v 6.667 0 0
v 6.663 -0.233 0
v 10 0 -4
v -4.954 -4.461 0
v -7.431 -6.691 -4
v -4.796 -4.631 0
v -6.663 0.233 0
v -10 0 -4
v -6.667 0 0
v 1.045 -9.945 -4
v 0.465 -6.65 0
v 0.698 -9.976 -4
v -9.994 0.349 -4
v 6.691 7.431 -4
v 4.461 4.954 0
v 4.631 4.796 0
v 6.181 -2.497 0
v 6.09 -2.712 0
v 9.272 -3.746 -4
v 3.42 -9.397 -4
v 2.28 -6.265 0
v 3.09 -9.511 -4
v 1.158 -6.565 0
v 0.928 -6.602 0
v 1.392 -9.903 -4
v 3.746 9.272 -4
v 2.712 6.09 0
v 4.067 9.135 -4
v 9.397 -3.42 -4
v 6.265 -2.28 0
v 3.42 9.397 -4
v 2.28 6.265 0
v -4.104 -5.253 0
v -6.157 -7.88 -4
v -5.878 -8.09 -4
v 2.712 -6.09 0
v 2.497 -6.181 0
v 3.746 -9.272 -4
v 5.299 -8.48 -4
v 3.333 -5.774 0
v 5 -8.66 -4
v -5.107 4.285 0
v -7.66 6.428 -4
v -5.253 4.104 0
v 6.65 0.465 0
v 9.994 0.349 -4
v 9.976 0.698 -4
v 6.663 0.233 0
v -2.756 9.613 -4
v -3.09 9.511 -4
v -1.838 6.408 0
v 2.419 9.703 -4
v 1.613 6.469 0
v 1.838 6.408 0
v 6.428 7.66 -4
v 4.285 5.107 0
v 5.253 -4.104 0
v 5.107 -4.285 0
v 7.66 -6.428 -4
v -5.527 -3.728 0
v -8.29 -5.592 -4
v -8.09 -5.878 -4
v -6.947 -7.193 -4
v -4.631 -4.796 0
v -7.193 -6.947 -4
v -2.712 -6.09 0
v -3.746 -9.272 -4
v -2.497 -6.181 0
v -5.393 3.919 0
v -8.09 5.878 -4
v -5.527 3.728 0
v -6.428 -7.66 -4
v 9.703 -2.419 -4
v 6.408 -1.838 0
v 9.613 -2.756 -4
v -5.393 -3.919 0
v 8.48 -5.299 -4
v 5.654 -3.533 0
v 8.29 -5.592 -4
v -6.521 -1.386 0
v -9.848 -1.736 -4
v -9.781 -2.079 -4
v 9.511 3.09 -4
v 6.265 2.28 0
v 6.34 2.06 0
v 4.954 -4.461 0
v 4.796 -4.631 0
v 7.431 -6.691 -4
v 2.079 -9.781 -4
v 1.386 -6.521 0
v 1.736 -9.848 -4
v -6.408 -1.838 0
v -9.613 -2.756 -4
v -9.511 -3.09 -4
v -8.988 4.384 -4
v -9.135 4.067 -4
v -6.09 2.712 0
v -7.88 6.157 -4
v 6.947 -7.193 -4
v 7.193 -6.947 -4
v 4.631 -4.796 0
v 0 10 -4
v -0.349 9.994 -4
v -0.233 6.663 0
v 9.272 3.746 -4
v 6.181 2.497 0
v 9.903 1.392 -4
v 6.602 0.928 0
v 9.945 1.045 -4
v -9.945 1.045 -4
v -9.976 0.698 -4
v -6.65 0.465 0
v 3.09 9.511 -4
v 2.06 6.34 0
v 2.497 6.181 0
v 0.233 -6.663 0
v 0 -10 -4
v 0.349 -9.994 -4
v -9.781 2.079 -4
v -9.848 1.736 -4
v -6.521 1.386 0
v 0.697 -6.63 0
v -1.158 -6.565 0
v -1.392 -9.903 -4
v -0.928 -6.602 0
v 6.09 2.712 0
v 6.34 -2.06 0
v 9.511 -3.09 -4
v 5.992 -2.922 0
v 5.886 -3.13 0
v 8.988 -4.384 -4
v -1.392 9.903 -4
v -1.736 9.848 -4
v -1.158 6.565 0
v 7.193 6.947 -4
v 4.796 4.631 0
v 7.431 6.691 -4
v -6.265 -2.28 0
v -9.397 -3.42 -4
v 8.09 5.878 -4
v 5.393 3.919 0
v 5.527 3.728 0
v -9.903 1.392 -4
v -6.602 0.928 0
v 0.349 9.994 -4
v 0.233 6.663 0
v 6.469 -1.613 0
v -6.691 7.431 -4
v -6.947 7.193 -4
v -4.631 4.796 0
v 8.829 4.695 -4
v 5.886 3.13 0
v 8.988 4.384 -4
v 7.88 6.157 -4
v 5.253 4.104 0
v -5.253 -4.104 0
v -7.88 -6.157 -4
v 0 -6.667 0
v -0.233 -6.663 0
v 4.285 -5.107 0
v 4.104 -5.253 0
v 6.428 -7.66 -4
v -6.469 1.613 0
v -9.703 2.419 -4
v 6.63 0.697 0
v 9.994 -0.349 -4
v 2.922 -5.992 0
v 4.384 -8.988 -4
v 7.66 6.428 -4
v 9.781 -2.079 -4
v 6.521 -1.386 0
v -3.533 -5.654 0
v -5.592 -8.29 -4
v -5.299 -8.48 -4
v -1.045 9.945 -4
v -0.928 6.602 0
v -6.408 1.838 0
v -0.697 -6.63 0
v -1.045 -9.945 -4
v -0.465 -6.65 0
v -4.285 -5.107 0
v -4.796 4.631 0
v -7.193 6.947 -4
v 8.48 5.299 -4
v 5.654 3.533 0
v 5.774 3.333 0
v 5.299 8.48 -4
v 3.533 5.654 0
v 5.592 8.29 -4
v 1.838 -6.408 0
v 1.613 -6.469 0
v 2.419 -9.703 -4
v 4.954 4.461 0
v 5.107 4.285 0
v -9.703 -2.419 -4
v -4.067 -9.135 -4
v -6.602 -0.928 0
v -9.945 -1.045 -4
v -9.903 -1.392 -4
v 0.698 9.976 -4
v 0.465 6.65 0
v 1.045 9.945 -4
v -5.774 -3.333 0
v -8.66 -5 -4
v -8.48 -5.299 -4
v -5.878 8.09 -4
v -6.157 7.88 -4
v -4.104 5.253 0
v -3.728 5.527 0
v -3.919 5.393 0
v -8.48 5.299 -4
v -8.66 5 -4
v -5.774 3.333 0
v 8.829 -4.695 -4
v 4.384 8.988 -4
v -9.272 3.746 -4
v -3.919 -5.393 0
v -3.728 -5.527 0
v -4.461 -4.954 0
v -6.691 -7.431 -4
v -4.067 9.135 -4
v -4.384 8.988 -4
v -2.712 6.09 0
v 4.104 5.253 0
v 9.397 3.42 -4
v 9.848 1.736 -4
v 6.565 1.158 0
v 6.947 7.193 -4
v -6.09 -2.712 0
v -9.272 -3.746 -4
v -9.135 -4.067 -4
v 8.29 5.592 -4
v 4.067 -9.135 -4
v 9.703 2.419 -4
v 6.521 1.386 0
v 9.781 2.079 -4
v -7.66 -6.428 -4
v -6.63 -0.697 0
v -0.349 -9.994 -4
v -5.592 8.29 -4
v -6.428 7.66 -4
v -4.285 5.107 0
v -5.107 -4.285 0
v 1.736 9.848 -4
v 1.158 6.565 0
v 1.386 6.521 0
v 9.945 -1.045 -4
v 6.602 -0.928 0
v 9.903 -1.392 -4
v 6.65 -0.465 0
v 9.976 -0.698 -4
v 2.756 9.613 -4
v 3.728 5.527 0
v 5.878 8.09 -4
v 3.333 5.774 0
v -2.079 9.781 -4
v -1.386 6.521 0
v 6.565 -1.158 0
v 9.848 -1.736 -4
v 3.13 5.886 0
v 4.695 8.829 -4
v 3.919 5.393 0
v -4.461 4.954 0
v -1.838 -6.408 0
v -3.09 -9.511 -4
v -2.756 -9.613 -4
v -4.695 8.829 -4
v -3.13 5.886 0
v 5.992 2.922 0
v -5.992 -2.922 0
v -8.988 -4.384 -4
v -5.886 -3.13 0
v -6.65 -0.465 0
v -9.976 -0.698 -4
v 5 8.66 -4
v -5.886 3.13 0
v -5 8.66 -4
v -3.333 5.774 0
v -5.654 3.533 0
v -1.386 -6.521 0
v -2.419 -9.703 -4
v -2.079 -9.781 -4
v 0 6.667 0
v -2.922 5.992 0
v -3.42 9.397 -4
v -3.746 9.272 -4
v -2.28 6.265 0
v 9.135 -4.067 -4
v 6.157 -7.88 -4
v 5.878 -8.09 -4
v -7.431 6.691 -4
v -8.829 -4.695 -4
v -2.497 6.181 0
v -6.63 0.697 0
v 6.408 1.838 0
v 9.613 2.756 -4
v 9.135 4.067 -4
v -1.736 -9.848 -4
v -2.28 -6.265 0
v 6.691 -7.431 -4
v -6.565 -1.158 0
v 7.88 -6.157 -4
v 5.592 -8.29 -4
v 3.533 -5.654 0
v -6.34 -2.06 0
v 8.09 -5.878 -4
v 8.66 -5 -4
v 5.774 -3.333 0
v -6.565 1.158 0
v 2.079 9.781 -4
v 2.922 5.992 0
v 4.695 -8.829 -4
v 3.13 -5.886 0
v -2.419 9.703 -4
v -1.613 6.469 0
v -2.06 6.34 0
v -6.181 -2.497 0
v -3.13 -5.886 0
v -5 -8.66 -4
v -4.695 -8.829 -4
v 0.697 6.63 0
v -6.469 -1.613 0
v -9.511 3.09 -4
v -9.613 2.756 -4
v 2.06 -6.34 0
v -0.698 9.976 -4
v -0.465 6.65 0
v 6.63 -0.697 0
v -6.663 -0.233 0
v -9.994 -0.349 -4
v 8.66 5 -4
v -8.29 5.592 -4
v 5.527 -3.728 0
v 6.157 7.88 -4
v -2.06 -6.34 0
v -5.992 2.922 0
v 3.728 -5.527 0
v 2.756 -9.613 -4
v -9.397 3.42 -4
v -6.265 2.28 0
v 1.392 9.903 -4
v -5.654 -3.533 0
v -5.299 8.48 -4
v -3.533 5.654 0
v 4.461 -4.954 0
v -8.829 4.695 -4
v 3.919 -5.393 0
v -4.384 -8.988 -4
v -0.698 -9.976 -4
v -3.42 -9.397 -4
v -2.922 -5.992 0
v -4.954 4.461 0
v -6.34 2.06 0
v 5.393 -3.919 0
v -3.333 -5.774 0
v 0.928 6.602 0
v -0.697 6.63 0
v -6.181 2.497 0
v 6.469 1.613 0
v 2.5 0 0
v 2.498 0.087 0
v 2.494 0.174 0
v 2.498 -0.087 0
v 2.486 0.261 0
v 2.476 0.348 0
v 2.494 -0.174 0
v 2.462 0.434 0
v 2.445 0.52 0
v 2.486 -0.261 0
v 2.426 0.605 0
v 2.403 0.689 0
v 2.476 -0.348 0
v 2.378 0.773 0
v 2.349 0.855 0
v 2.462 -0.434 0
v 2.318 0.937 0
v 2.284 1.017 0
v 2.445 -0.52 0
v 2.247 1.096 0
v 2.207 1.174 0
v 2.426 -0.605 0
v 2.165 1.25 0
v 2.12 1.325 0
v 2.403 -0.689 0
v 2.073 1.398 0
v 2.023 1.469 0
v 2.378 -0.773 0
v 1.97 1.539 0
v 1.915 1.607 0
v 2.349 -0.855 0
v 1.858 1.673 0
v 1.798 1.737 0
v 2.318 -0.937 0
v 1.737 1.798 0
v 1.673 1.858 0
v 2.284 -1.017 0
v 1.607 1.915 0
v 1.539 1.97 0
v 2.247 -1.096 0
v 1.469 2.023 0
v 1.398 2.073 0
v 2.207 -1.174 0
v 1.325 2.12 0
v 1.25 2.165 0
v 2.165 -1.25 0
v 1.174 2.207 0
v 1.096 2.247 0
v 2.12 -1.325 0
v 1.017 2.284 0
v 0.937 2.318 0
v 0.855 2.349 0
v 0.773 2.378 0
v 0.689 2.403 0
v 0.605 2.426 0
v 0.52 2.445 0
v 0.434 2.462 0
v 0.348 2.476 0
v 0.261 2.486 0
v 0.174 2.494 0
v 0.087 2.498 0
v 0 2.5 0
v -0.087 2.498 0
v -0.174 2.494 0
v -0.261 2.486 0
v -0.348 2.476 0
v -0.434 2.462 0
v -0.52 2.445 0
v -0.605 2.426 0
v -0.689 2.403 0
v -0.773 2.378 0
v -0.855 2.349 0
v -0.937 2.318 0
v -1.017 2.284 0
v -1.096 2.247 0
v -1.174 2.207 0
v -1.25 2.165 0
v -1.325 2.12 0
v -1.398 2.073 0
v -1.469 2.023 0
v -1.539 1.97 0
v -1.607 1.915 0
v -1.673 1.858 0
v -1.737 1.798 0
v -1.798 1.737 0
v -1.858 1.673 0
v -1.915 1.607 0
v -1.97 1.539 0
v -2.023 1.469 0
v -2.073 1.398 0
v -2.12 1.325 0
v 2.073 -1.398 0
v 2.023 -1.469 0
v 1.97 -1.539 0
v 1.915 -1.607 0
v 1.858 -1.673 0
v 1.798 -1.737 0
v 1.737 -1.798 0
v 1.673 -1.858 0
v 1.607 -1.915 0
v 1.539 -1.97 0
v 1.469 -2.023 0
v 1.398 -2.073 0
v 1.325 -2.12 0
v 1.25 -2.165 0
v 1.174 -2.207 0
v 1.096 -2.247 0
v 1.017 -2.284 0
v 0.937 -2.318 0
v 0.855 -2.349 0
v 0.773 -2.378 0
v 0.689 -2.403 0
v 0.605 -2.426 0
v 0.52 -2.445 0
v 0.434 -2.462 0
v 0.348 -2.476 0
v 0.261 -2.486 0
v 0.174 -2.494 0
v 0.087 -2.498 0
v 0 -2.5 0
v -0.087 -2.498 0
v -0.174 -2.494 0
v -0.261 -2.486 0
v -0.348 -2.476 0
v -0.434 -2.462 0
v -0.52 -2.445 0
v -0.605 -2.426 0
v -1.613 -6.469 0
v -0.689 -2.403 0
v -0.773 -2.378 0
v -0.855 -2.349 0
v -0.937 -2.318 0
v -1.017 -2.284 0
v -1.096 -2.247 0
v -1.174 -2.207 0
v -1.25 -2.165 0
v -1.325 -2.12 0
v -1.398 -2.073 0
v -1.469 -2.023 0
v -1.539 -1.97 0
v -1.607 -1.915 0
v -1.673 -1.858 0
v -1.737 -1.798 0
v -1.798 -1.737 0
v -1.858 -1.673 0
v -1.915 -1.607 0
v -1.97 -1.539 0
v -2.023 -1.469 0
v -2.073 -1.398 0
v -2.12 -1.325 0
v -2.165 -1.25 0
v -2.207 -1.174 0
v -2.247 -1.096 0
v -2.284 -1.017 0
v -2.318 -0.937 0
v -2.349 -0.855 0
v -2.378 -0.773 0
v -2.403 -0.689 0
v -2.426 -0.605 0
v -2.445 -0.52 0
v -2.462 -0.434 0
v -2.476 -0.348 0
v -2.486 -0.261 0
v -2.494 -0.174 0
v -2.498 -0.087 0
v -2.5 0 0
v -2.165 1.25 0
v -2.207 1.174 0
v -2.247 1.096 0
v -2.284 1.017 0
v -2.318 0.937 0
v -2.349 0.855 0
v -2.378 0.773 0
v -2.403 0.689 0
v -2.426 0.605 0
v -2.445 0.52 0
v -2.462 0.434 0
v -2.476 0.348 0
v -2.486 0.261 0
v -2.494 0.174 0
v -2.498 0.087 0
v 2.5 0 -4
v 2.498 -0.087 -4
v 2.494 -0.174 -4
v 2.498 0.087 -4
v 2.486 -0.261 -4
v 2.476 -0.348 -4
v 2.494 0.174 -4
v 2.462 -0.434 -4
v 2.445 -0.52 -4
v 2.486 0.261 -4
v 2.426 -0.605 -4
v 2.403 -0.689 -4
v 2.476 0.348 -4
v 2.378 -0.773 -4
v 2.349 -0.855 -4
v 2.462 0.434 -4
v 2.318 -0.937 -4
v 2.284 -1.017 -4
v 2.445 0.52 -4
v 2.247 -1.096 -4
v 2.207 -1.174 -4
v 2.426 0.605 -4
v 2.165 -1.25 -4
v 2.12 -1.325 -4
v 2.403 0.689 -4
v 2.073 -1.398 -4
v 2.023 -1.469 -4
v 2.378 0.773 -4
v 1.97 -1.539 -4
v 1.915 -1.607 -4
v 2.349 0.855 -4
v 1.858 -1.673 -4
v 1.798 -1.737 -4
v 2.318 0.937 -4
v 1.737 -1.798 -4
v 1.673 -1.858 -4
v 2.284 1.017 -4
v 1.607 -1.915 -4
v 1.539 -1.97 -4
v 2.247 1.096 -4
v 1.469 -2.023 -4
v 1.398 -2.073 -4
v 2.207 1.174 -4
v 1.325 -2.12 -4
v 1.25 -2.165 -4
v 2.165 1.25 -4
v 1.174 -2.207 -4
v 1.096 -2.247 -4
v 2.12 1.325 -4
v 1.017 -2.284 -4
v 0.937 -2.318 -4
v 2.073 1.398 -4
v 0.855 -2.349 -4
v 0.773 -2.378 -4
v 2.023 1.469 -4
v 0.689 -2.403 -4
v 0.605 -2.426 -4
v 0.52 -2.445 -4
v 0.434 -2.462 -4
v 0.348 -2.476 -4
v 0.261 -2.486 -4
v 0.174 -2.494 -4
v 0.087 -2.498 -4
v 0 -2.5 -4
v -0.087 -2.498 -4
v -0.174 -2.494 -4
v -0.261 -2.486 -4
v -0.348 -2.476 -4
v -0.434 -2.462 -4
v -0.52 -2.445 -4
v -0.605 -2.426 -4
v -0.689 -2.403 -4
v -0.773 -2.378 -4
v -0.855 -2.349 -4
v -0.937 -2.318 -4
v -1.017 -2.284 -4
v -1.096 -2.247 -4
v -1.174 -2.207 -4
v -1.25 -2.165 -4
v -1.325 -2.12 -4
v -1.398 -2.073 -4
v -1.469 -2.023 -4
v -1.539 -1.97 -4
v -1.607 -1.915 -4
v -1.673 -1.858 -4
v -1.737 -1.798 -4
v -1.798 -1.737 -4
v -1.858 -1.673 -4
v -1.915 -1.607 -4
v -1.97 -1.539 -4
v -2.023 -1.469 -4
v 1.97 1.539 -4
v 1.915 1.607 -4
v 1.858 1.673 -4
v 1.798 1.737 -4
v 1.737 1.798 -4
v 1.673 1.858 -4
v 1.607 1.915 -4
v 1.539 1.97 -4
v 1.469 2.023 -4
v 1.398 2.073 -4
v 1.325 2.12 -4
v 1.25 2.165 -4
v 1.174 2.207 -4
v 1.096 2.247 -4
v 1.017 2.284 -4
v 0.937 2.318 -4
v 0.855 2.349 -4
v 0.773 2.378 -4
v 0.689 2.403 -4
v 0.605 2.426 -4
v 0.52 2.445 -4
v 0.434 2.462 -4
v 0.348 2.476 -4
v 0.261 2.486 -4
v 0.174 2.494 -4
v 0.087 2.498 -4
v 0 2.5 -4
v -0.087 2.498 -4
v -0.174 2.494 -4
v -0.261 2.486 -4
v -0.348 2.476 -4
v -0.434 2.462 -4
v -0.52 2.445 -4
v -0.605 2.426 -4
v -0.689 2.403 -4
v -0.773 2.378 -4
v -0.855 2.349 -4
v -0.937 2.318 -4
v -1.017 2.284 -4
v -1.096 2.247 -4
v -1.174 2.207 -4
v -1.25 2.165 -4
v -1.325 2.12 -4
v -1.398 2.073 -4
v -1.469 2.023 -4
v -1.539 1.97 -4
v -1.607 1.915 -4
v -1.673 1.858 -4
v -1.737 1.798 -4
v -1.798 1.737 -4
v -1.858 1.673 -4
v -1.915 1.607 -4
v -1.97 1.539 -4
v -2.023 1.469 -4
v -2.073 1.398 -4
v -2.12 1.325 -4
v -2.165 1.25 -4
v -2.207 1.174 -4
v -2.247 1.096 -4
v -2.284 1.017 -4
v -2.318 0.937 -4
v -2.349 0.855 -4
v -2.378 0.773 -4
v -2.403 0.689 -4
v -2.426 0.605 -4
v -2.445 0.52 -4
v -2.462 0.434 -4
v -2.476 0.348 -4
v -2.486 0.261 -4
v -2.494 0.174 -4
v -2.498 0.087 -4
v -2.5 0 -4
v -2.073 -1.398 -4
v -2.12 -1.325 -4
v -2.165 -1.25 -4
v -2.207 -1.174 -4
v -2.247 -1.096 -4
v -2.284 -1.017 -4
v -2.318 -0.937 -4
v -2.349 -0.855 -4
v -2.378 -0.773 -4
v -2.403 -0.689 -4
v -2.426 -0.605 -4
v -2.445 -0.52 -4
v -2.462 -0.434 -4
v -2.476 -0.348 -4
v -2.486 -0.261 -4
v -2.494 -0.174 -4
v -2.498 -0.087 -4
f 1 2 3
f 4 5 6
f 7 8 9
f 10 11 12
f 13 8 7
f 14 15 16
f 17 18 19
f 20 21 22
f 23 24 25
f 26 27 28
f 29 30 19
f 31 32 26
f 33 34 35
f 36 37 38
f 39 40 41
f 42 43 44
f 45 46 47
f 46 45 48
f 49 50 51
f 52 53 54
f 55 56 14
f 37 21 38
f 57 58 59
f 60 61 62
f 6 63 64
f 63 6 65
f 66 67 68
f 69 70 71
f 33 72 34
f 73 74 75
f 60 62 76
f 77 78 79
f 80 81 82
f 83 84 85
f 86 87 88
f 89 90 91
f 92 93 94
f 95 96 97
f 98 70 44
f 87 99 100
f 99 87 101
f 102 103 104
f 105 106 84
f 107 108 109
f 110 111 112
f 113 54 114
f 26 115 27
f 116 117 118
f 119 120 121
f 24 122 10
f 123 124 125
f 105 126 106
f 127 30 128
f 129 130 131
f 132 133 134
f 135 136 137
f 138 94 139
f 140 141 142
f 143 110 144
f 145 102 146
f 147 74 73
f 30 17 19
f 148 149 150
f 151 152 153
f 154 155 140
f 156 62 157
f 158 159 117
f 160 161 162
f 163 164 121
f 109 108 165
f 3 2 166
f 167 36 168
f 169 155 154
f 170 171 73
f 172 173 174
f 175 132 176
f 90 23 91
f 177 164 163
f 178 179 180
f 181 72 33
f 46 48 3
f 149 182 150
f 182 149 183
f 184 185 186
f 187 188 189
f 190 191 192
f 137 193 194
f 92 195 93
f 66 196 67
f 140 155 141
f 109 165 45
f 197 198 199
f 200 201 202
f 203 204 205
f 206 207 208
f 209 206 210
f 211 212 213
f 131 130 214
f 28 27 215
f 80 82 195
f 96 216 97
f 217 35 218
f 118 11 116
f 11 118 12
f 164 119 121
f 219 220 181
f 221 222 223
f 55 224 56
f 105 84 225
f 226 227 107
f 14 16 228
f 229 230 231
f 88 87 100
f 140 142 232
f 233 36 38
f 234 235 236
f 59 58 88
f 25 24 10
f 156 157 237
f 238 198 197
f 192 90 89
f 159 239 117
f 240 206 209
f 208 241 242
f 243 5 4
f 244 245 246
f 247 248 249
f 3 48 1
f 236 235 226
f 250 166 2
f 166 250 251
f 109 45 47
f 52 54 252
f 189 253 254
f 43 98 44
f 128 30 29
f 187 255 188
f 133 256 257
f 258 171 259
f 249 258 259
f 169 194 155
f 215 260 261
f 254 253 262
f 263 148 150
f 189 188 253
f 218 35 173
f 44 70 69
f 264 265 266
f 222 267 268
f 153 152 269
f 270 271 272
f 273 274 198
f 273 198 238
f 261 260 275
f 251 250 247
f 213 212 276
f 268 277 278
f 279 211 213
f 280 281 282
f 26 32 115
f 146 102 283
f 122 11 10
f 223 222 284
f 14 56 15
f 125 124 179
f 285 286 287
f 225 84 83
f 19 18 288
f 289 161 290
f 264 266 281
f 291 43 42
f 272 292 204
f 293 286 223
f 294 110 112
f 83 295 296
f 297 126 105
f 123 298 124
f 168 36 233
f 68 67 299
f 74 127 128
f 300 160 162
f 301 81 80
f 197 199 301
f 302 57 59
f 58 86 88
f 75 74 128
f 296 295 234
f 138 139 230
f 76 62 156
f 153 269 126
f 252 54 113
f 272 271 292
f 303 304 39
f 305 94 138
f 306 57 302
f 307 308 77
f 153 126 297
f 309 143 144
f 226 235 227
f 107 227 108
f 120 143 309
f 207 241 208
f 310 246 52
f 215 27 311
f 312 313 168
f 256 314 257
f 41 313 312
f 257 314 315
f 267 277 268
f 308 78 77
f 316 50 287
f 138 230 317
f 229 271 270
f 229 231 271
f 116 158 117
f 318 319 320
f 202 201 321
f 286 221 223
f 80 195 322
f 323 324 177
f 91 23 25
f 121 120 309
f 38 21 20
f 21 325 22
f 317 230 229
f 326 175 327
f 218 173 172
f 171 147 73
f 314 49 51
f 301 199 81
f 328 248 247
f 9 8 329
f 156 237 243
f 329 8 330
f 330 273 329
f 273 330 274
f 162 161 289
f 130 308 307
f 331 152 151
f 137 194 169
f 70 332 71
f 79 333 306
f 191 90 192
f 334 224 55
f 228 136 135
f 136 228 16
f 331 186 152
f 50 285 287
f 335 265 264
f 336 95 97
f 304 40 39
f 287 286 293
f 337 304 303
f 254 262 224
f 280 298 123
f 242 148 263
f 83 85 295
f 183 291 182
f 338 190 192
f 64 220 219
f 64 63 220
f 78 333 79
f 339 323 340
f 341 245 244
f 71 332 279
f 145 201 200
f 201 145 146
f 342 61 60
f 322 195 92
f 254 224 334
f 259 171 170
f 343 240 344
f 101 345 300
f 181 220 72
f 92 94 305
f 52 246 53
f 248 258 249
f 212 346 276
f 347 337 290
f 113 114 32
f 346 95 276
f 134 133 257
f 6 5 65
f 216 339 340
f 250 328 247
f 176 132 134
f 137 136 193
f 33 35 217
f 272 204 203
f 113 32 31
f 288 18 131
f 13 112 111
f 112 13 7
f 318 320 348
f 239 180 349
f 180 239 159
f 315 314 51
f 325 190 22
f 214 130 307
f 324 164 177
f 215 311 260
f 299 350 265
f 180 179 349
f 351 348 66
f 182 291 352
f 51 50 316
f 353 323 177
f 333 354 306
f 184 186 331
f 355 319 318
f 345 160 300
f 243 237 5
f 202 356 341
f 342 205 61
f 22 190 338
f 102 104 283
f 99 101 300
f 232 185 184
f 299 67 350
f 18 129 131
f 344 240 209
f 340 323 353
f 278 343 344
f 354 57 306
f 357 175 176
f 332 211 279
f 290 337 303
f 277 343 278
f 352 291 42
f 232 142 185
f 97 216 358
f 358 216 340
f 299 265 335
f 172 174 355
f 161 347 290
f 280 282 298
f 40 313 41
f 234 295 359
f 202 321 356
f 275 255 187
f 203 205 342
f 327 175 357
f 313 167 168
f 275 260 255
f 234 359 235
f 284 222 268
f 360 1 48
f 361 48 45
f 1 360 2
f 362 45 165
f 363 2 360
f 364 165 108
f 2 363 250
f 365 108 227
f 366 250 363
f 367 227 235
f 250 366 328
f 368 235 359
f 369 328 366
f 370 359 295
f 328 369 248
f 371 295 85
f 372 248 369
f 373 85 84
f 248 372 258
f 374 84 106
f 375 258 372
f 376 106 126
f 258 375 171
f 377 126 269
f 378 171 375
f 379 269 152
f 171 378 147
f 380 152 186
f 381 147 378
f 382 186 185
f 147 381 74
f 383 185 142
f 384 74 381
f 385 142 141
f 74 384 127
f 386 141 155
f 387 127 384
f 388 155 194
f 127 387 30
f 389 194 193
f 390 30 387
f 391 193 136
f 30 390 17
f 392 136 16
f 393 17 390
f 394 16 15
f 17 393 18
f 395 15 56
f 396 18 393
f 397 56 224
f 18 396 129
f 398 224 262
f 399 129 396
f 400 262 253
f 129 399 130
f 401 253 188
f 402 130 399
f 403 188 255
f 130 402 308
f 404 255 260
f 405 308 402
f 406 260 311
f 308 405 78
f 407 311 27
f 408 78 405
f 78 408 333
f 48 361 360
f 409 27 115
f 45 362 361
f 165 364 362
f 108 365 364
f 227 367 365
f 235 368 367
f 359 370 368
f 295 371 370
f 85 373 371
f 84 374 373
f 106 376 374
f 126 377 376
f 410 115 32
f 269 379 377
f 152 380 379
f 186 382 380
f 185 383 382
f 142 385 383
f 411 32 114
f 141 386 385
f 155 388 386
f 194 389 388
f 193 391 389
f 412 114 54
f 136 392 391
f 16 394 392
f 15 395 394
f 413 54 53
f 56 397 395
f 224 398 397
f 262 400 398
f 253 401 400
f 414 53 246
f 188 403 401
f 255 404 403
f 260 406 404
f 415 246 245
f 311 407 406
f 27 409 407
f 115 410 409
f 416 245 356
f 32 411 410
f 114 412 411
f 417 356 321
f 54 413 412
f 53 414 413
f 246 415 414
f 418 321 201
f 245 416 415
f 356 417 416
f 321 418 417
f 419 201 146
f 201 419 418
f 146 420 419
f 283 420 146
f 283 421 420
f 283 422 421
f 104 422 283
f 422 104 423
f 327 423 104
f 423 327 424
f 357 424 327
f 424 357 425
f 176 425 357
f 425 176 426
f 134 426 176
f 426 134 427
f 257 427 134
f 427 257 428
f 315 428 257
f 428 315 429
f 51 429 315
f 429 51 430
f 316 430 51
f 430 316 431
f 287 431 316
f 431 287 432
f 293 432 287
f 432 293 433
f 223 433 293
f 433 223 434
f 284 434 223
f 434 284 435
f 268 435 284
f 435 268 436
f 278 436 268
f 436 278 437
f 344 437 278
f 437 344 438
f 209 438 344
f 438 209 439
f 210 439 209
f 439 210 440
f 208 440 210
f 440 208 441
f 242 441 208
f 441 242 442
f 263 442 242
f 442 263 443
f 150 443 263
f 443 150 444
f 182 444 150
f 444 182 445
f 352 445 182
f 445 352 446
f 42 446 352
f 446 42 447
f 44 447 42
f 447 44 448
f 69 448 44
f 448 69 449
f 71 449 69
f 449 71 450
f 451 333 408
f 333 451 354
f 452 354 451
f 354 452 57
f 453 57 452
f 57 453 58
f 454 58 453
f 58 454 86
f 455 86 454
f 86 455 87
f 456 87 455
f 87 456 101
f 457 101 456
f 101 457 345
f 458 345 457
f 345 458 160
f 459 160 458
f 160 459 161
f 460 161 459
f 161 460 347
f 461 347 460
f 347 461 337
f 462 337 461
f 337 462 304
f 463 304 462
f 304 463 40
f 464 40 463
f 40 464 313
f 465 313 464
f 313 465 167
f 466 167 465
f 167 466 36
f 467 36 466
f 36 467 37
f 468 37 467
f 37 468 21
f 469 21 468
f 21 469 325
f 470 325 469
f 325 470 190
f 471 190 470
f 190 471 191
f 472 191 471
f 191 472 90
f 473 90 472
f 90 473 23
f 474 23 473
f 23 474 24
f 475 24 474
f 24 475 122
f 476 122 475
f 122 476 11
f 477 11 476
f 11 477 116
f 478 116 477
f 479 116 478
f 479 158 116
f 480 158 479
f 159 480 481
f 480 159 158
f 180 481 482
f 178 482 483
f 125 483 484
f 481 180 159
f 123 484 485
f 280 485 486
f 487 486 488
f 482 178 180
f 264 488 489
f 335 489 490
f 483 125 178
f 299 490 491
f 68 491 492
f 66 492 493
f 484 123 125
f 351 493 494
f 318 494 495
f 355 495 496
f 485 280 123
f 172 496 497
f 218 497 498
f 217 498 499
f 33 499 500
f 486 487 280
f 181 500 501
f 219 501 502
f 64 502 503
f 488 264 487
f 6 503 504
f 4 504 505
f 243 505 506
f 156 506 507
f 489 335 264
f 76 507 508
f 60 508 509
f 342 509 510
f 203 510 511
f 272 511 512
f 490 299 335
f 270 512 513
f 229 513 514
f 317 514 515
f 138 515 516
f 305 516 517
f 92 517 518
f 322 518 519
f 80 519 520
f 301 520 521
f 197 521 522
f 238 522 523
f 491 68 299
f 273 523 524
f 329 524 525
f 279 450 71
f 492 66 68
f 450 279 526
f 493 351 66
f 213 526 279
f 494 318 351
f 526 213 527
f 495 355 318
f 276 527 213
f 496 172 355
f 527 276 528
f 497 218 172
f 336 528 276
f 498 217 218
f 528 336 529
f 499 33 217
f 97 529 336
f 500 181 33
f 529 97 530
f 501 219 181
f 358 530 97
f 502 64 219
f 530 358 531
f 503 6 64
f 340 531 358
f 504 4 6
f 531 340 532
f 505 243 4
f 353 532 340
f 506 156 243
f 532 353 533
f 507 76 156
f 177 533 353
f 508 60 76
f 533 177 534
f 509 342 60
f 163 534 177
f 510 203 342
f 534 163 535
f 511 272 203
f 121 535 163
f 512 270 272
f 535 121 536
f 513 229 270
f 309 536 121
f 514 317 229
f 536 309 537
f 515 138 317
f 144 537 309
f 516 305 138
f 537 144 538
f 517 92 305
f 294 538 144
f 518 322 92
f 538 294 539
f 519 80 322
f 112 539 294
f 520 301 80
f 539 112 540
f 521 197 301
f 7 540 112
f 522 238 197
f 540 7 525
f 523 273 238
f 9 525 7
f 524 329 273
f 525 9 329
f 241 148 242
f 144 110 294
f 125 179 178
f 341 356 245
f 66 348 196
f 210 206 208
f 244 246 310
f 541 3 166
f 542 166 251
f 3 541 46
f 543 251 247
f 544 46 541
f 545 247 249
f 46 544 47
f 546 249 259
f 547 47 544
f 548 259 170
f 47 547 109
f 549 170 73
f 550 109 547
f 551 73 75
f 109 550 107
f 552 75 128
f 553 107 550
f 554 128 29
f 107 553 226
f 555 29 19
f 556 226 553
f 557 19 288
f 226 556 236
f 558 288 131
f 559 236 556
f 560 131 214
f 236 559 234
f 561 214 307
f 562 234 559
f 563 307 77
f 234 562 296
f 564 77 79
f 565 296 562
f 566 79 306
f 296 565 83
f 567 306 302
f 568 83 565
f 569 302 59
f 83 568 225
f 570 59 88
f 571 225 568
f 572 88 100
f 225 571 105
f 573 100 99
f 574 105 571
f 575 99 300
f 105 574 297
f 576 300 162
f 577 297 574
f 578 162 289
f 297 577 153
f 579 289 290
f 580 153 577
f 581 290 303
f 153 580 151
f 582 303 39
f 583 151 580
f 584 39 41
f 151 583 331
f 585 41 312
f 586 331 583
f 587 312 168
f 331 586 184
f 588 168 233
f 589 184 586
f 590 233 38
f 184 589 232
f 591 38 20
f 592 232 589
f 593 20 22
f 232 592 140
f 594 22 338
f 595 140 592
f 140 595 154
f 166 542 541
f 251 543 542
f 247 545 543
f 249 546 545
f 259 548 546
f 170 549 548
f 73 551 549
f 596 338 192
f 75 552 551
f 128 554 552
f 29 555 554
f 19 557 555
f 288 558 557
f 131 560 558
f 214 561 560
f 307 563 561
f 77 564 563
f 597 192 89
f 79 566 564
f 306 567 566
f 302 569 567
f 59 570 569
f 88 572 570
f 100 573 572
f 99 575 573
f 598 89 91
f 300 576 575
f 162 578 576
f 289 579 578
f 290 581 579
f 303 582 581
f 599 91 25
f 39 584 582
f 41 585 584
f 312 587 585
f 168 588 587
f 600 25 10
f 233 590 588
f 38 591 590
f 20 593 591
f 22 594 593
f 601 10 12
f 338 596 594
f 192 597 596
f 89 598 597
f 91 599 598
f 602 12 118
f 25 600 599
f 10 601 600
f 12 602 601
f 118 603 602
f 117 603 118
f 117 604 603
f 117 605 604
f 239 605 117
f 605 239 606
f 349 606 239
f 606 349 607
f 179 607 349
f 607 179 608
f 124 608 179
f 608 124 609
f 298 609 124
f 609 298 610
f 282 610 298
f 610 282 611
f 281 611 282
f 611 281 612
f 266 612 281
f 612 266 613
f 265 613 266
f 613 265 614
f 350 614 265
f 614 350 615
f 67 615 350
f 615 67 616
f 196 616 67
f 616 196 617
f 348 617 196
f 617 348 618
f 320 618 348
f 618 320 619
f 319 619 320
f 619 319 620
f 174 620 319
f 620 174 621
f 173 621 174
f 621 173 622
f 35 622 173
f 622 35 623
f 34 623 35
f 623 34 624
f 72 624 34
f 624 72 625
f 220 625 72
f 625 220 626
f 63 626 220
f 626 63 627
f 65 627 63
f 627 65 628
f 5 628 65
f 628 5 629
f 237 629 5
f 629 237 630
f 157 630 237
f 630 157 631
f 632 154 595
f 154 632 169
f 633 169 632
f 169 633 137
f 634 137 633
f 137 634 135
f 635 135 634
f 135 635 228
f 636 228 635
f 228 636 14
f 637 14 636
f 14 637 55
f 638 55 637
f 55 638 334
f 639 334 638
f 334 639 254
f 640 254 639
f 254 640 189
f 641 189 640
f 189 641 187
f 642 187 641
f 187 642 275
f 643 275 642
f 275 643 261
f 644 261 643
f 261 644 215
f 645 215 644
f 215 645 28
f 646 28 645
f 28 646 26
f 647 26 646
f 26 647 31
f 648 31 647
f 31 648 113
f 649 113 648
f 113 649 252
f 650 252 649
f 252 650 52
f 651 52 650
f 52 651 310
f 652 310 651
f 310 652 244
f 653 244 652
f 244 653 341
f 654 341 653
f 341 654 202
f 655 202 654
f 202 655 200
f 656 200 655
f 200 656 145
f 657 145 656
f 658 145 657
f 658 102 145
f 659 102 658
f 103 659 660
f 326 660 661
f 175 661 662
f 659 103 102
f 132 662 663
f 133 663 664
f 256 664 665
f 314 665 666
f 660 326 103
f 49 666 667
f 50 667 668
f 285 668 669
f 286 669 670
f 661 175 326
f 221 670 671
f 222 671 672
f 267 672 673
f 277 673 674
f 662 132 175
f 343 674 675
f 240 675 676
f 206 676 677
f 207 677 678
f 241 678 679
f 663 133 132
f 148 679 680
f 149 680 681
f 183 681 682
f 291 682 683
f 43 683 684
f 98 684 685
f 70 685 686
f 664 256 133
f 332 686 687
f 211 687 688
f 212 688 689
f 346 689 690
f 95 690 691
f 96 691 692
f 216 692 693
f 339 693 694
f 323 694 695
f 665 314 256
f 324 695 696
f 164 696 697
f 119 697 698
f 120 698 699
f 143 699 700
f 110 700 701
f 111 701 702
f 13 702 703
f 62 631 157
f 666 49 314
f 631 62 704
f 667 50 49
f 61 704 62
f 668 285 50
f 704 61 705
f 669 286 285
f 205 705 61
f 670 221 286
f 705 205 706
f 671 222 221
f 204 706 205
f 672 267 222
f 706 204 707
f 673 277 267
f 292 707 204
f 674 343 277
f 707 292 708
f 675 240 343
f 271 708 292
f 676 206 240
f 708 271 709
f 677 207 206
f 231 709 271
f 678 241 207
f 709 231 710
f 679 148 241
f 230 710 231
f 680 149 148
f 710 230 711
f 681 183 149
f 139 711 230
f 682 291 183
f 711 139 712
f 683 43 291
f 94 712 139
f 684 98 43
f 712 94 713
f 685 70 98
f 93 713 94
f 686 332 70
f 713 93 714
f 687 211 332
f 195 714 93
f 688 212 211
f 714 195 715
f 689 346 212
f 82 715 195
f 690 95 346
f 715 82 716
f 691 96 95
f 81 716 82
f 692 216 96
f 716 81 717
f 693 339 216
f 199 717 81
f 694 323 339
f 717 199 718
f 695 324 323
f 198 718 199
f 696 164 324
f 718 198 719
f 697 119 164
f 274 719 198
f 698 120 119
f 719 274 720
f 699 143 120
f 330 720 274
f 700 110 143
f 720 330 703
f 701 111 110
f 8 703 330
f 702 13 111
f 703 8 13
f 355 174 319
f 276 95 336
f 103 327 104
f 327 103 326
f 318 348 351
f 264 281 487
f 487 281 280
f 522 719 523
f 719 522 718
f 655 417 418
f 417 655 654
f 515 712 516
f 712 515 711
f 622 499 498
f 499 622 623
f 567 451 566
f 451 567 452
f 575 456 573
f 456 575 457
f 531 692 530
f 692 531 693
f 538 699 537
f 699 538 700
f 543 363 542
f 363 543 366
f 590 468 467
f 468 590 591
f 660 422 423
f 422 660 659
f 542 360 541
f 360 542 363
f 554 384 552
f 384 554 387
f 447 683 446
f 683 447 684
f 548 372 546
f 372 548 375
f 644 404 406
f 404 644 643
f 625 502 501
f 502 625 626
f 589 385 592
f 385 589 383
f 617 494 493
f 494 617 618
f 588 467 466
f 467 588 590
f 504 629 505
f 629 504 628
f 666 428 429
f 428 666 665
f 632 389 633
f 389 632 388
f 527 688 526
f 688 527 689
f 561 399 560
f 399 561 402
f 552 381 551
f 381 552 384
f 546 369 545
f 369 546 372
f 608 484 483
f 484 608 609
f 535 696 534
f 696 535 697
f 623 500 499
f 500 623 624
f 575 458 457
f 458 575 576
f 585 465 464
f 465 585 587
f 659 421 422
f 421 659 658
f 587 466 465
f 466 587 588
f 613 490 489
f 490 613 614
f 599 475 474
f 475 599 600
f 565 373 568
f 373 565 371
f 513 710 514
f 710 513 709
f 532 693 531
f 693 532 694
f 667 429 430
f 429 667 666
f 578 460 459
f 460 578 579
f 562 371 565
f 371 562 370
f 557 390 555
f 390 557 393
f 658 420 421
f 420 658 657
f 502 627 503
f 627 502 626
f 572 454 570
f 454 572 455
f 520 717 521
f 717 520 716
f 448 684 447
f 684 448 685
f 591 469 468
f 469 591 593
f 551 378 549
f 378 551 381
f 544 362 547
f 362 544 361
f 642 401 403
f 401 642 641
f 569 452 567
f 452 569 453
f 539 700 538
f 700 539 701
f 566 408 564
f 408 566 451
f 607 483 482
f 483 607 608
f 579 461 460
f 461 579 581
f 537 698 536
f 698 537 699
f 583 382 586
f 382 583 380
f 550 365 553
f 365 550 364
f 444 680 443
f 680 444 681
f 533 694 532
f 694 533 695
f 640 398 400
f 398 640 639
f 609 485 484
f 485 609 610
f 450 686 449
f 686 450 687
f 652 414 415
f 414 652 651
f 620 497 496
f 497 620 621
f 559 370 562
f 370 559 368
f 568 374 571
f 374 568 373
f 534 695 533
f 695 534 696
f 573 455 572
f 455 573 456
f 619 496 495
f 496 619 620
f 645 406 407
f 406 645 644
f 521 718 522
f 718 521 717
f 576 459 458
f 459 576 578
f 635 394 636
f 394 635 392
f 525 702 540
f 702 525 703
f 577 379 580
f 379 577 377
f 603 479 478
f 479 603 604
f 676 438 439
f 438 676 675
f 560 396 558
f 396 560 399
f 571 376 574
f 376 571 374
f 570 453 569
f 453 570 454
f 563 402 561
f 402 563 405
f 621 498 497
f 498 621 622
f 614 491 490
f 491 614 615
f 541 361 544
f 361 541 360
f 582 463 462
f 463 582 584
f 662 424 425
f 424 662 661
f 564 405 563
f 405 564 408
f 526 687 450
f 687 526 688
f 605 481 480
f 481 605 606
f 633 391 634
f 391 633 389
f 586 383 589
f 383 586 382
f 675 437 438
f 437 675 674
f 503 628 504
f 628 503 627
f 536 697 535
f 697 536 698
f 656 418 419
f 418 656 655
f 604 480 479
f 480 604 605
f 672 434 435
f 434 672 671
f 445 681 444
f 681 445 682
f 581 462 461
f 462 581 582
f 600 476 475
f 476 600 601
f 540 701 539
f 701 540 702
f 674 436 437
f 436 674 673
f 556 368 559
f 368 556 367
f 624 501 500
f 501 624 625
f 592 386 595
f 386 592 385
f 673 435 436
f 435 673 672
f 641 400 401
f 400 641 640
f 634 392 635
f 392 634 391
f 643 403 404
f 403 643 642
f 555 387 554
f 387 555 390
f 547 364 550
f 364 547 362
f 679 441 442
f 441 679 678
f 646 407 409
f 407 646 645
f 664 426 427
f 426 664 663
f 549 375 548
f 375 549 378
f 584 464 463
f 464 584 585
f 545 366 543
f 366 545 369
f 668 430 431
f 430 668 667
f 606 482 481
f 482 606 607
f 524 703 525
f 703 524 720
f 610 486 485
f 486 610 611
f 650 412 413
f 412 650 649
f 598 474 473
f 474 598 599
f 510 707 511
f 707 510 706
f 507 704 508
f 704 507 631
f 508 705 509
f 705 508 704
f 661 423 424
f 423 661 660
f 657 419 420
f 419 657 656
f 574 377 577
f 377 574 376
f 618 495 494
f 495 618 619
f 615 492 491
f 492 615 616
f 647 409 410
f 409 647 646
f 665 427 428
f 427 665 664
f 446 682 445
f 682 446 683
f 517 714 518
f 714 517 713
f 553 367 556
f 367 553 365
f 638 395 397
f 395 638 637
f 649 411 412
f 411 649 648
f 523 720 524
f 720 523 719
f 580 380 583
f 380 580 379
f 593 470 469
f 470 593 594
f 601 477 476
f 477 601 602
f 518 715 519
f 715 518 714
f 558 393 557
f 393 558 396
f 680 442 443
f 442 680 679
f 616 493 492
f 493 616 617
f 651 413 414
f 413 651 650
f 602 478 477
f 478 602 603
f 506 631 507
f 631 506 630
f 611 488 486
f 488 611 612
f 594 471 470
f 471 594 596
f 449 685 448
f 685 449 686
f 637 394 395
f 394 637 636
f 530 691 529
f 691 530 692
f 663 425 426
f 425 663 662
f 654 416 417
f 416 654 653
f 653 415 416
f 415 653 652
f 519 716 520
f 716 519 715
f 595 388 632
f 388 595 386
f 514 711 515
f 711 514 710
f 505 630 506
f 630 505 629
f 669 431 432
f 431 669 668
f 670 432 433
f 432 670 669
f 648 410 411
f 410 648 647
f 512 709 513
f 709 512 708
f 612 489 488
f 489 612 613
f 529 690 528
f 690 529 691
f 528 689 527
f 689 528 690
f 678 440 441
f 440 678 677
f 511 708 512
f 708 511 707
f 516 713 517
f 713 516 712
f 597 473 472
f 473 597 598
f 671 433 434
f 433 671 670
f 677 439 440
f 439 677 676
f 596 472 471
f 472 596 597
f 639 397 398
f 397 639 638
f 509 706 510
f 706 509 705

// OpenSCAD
$fn=180;
pad=0.1;
padd=pad*2;
bar_l=200;
bar_w=15;
bar_h=40;
pivot_gap=1;
pivot_d=20;
pivot_r=pivot_d/2;
screw_d=5;
screw_r=screw_d/2;

catch_plate_w=30;
catch_plate_d=15;
catch_plate_r=catch_plate_w/2;

catch_d=bar_h/2;
backboard=bar_h;
catch_arm_h=25;
catch_gap=50;

safety=11;

ramp_l=sqrt(2*((catch_d+catch_arm_h)*(catch_d+catch_arm_h)));

catch_plate_h=catch_d+backboard+catch_arm_h+catch_plate_r*2;
catch_plate_max_d=catch_arm_h+catch_plate_d+catch_d+catch_gap;

guide_w=30;
guide_t=10;
small_slot=9;
large_slot=13;
slot_d=8;
guide_d=36;
guide_h=150+guide_w;
center_h=40;
center_gap=2;

lever_pivot_d=9;
lever_pivot_to_bar=62;
lever_pivot_r=lever_pivot_d/2;
lever_w=20;
lever_wall=10;
cam_w=15;
lever_h=150;

mount_d=9;
mount_r=mount_d/2;
mount_wall=lever_wall;
mount_w=20;
mount_cap=3;
grip=0.5;
mount_t=30;

spacer=40;

module spacer() {
    difference() {
        cylinder(r=mount_r+mount_wall,h=spacer);
        translate([0,0,-pad])
        cylinder(r=mount_r,h=spacer+padd);
    }
}

module washer() {
    difference() {
        cylinder(r1=mount_w/3,r2=mount_w/2,h=mount_r-grip);
        translate([0,0,-pad])
        cylinder(r=screw_r,h=mount_r-grip+padd);
    }
}

module mount() {
    difference() {
        rotate([0,-90,0])
        cylinder(r=mount_r+mount_wall,h=mount_w);
        translate([pad,0,0])
        rotate([0,-90,0])
        cylinder(r=mount_r,h=mount_w+pad-mount_cap);
        translate([-mount_w-pad,mount_r-grip,-mount_r-mount_wall])
        cube([mount_w+padd,mount_wall+pad+grip,mount_r*2+mount_wall*2]);
        translate([-mount_w+mount_cap,0,-mount_r])
        cube([mount_w-mount_cap+pad,mount_r,mount_d]);
    }
    translate([-mount_w,0,0])
    rotate([0,180,0])
    ear();
    ear();
}

module ear() {
    difference() {
        union() {
            translate([-mount_w,-mount_wall+mount_r-grip,-mount_t-mount_w/2-mount_r-mount_wall])
            cube([mount_w,mount_wall,mount_t+mount_w/2+mount_wall]);
            translate([-mount_w/2,mount_r-grip,-mount_r-mount_t-mount_w])
            rotate([90,0,0])
            cylinder(r=mount_w/2,h=mount_wall);
        }
        translate([-mount_w/2-screw_r,-mount_wall+mount_r-grip-pad,-mount_r-mount_wall-mount_t-mount_w/2])
        cube([screw_d,mount_wall+padd,mount_t]);
        translate([-mount_w/2,mount_r-grip+pad,-mount_r-mount_wall-mount_t-mount_w/2])
        rotate([90,0,0])
        cylinder(r=screw_r,h=mount_wall+padd);
        translate([-mount_w/2,mount_r-grip+pad,-mount_r-mount_wall-mount_w/2])
        rotate([90,0,0])
        cylinder(r=screw_r,h=mount_wall+padd);
    }

}

module lever() {
    difference() {
        union() {
            rotate([0,90,0])
            cylinder(r=lever_pivot_r+lever_wall,h=lever_w);
            translate([0,-cam_w+lever_pivot_r+lever_wall,-lever_h])
            cube([lever_w,cam_w,lever_h]);
        }
        rotate([0,90,0])
        translate([0,0,-pad])
        cylinder(r=lever_pivot_r,h=lever_w+padd);
    }
    difference() {
        rotate([0,90,0])
        cylinder(r=lever_pivot_to_bar,h=lever_w);
        rotate([0,90,0])
        translate([0,0,-pad])
        cylinder(r=lever_pivot_to_bar-cam_w,h=lever_w+padd);
        translate([-pad,-lever_pivot_to_bar-pad,0])
        cube([lever_w+padd,lever_pivot_to_bar*2+padd,lever_pivot_to_bar+pad]);
        translate([-pad,lever_pivot_r+lever_wall,-lever_pivot_to_bar-pad])
        cube([lever_w+padd,lever_pivot_to_bar+pad,lever_pivot_to_bar+padd]);
    }
}

module guide() {
    translate([0,0,-guide_w/2])
    difference() {
        cube([guide_w,guide_t,guide_h]);
        translate([guide_w/2-small_slot/2,-pad,-pad])
        cube([small_slot,guide_t+padd,guide_h+padd]);
        translate([guide_w/2-large_slot/2,guide_t-slot_d+pad,-pad])
        cube([large_slot,slot_d+pad,guide_h+padd]);
    }
    translate([guide_w/2,0,guide_h-guide_w/2])
    rotate([-90,0,0])
    difference() {
        cylinder(r=guide_w/2,h=guide_t+guide_d);
        translate([0,0,-pad])
        cylinder(r=screw_r,h=guide_t+guide_d+padd);
    }
    translate([guide_w/2,0,-guide_w/2])
    rotate([-90,0,0])
    difference() {
        cylinder(r=guide_w/2,h=guide_t+guide_d);
        translate([0,0,-pad])
        cylinder(r=screw_r,h=guide_t+guide_d+padd);
    }
    translate([0,0,guide_h/2-guide_w/2-center_h/2])
    difference() {
        cube([guide_w,guide_t-center_gap,center_h]);
        translate([guide_w/2,-pad,center_h])
        rotate([-90,0,0]) {
            cylinder(r=small_slot/2,h=guide_t);
            translate([0,0,guide_t-slot_d])
            cylinder(r=large_slot/2,h=guide_t);
        }
        translate([guide_w/2,-pad,0])
        rotate([-90,0,0]){
            cylinder(r=small_slot/2,h=guide_t);
            translate([0,0,guide_t-slot_d])
            cylinder(r=large_slot/2,h=guide_t);
        }
    }
}

module bar() {
    difference() {
        union() {
            translate([bar_h/2,0,bar_h/2])
            rotate([-90,0,0])
            cylinder(r=bar_h/2,h=bar_w);
            translate([bar_h/2,0,bar_w])
            cube([bar_l,bar_w,bar_h-bar_w]);
            difference() {
                translate([bar_l+bar_h/2,0,bar_w])
                rotate([0,-90,0])
                cylinder(r=bar_w,h=bar_l);
                translate([bar_h/2-pad,-bar_w-pad,-pad])
                cube([bar_l+padd,bar_w+pad,bar_w*2+padd]);
            }
        }
        translate([bar_h/2,-pad,bar_h/2])
        rotate([-90,0,0])
        cylinder(r=pivot_r+pivot_gap,h=bar_w+padd);
    }
}

module pivot() {
    translate([bar_h/2,-pivot_gap,bar_h/2])
    rotate([-90,0,0]) 
    difference() {
        union() {
            cylinder(r=pivot_r,h=bar_w+pivot_gap*2);
            translate([0,0,-bar_w/2])
            cylinder(r=bar_h/2,h=bar_w/2);
        }
        translate([0,0,-bar_w/2-pad])
        cylinder(r=screw_r,h=bar_w/2+bar_w+pivot_gap*2+padd);
    }
}
module catch() {
    difference() {
        union() {
            translate([catch_plate_r,0,catch_plate_h-catch_plate_r])
            rotate([-90,0,0])
            cylinder(r=catch_plate_r,h=catch_plate_d);
            translate([catch_plate_r,0,-catch_plate_r])
            rotate([-90,0,0])
            cylinder(r=catch_plate_r,h=catch_plate_d);
            translate([0,0,-catch_plate_r])
            cube([catch_plate_w,catch_plate_d,catch_plate_h]);
        }
        translate([catch_plate_r,-pad,catch_plate_h-catch_plate_r])
        rotate([-90,0,0])
        cylinder(r=screw_r,h=catch_plate_d+padd);
        translate([catch_plate_r,-pad,-catch_plate_r])
        rotate([-90,0,0])
        cylinder(r=screw_r,h=catch_plate_d+padd);
    }
    translate([0,-catch_gap,0])
    cube([catch_plate_w,catch_gap,catch_arm_h]);
    difference() {
        translate([0,-catch_plate_max_d+catch_plate_d,0])
        rotate([-45,0,0])
        cube([catch_plate_w,ramp_l,ramp_l]);
        translate([-pad,-pad-catch_plate_max_d+catch_plate_d,-ramp_l])
        cube([catch_plate_w+padd,catch_plate_max_d+padd,ramp_l]);
        translate([-pad,-catch_gap,0])
        //this one is mess, don't care
        cube([catch_plate_w+padd,catch_plate_max_d+padd,ramp_l]);
        translate([-pad,-catch_plate_max_d+catch_plate_d,-pad])
        cube([catch_plate_w+padd,safety,safety+pad]);
    }
}

module push() {

fudge = 0.1;

module poly_path2990(h)
{
  scale([25.4/90, -25.4/90, 1]) union()
  {
    difference()
    {
       linear_extrude(height=h)
         polygon([[-39.445310,-268.885770],[5.484380,-268.885770],[14.919395,-268.327609],[19.198559,-267.629963],[23.185492,-266.653275],[26.880197,-265.397543],[30.282673,-263.862769],[33.392921,-262.048951],[36.210940,-259.956090],[38.732271,-257.622564],[40.917428,-255.051743],[42.766413,-252.243624],[44.279225,-249.198210],[45.455864,-245.915499],[46.296332,-242.395493],[46.800627,-238.638189],[46.968750,-234.643590],[46.800627,-230.631362],[46.296332,-226.856446],[45.455864,-223.318841],[44.279225,-220.018546],[42.766413,-216.955561],[40.917428,-214.129886],[38.732271,-211.541519],[36.210940,-209.190460],[33.392921,-207.114031],[30.282673,-205.314462],[26.880197,-203.791752],[23.185492,-202.545901],[19.198559,-201.576910],[14.919395,-200.884778],[5.484380,-200.331090],[-12.375000,-200.331090],[-12.375000,-163.909210],[-39.445310,-163.909210],[-39.445310,-268.885770]]);
       translate([0, 0, -fudge])
         linear_extrude(height=h+2*fudge)
           polygon([[-12.375000,-249.268590],[-12.375000,-219.948270],[2.601560,-219.948270],[6.314906,-220.185546],[9.580033,-220.897450],[12.396941,-222.083984],[14.765630,-223.745150],[16.642053,-225.876461],[17.982371,-228.403304],[18.786584,-231.325680],[19.054690,-234.643590],[18.786584,-237.957021],[17.982371,-240.866184],[16.642053,-243.371080],[14.765630,-245.471710],[12.396941,-247.132797],[9.580033,-248.319305],[6.314906,-249.031235],[2.601560,-249.268590],[-12.375000,-249.268590]]);
    }
  }
}

module poly_path2994(h)
{
  scale([25.4/90, -25.4/90, 1]) union()
  {
    linear_extrude(height=h)
      polygon([[34.453130,22.948910],[34.453130,45.167660],[25.910101,41.775147],[17.578130,39.331730],[9.580036,37.855228],[2.039060,37.362980],[-2.496119,37.530018],[-6.398470,38.031010],[-9.667994,38.865955],[-12.304690,40.034850],[-14.334981,41.555404],[-15.785183,43.445069],[-16.655293,45.703845],[-16.945310,48.331730],[-16.751973,50.326886],[-16.171903,52.093499],[-15.205098,53.631570],[-13.851560,54.941100],[-11.953147,56.061742],[-9.421905,57.103259],[-2.460940,58.948910],[9.070310,61.269230],[17.191365,63.255590],[24.046819,65.698959],[29.636675,68.599338],[33.960940,71.956730],[37.190867,75.920619],[39.497979,80.640351],[40.882273,86.115928],[41.343750,92.347350],[41.182222,96.550727],[40.697704,100.477245],[39.890196,104.126906],[38.759699,107.499709],[37.306212,110.595654],[35.529735,113.414743],[33.430267,115.956974],[31.007810,118.222350],[28.271093,120.199889],[25.193808,121.913756],[21.775953,123.363952],[18.017529,124.550475],[13.918535,125.473327],[9.478970,126.132506],[-0.421870,126.659850],[-10.423859,126.185241],[-20.460940,124.761410],[-30.515640,122.405945],[-40.570310,119.136410],[-40.570310,96.284850],[-30.691419,100.978224],[-21.164060,104.370790],[-16.497091,105.539746],[-11.917999,106.374709],[-7.426782,106.875680],[-3.023440,107.042660],[1.146941,106.858102],[4.798786,106.304396],[7.932098,105.381543],[10.546880,104.089540],[12.607878,102.454786],[14.080033,100.503618],[14.963343,98.236036],[15.257810,95.652040],[15.055627,93.331744],[14.449170,91.292688],[13.438440,89.534869],[12.023440,88.058290],[10.041471,86.757531],[7.259723,85.527070],[-0.703120,83.277040],[-11.179690,80.956730],[-18.527362,79.018765],[-24.820334,76.579809],[-30.058609,73.639858],[-34.242190,70.198910],[-37.410649,66.186740],[-39.673833,61.532945],[-41.031739,56.237525],[-41.484370,50.300480],[-41.326171,46.493742],[-40.851565,42.913317],[-40.060552,39.559203],[-38.953131,36.431400],[-37.529303,33.529908],[-35.789067,30.854726],[-33.732423,28.405853],[-31.359370,26.183290],[-28.689702,24.205784],[-25.743177,22.491940],[-22.519793,21.041759],[-19.019551,19.855240],[-15.242451,18.932384],[-11.188493,18.273190],[-2.250000,17.745790],[6.521440,18.079853],[15.539060,19.081730],[24.837834,20.681413],[34.453130,22.948910]]);
  }
}

module poly_path2992(h)
{
  scale([25.4/90, -25.4/90, 1]) union()
  {
    linear_extrude(height=h)
      polygon([[-45.210940,-124.620790],[-18.140620,-124.620790],[-18.140620,-61.691100],[-17.876971,-55.648601],[-17.085962,-50.528968],[-15.767596,-46.332198],[-13.921870,-43.058290],[-11.443386,-40.628100],[-8.296914,-38.892256],[-4.482452,-37.850756],[0.000000,-37.503600],[4.508755,-37.850756],[8.331985,-38.892256],[11.469693,-40.628100],[13.921880,-43.058290],[15.798302,-46.332198],[17.138618,-50.528968],[17.942830,-55.648601],[18.210940,-61.691100],[18.210940,-124.620790],[45.281250,-124.620790],[45.281250,-61.691100],[45.106535,-56.296805],[44.582464,-51.258470],[43.709037,-46.576095],[42.486254,-42.249679],[40.914115,-38.279222],[38.992620,-34.664723],[36.721768,-31.406183],[34.101560,-28.503600],[31.123139,-25.949280],[27.777784,-23.735537],[24.065494,-21.862369],[19.986269,-20.329776],[15.540107,-19.137759],[10.727009,-18.286318],[5.546973,-17.775451],[0.000000,-17.605160],[-5.530532,-17.775451],[-10.696312,-18.286318],[-15.497341,-19.137759],[-19.933620,-20.329776],[-24.005150,-21.862369],[-27.711931,-23.735537],[-31.053964,-25.949280],[-34.031250,-28.503600],[-36.651494,-31.406183],[-38.922371,-34.664723],[-40.843882,-38.279222],[-42.416026,-42.249679],[-43.638804,-46.576095],[-44.512215,-51.258470],[-45.036261,-56.296805],[-45.210940,-61.691100],[-45.210940,-124.620790]]);
  }
}

module poly_path2996(h)
{
  scale([25.4/90, -25.4/90, 1]) union()
  {
    linear_extrude(height=h)
      polygon([[-47.039060,163.909210],[-19.968750,163.909210],[-19.968750,203.917020],[19.968750,203.917020],[19.968750,163.909210],[47.039060,163.909210],[47.039060,268.885770],[19.968750,268.885770],[19.968750,224.377960],[-19.968750,224.377960],[-19.968750,268.885770],[-47.039060,268.885770]]);
  }
}

poly_path2990(1);
poly_path2994(1);
poly_path2992(1);
poly_path2996(1);
}

push_plate_h=4;
push_plate_l=180;
push_plate_w=50;

module push_plate() {
    cube([push_plate_w,push_plate_l,push_plate_h],center=true);
}

//push();
//color("red")
//translate([0,0,-push_plate_h/2])
//push_plate();

//translate([-bar_l+bar_h*2,lever_pivot_to_bar-bar_w,0]) {
    //lever();
    //translate([-10,0,0])
    //mirror([1,0,0])
    //mount();
//}

//translate([0,100,0])
rotate([180,0,0])
washer();

//translate([40,100,0])
//spacer();
//
//translate([-guide_w,-bar_w*2-pivot_gap,0])
//guide();
//translate([0,0,-catch_arm_h])
//color("cyan")
//catch();
//translate([-bar_l/12*11,-bar_w-pivot_gap,0]) {
    //color("lime")
    //bar();
    //color("magenta")
    //pivot();
//}
